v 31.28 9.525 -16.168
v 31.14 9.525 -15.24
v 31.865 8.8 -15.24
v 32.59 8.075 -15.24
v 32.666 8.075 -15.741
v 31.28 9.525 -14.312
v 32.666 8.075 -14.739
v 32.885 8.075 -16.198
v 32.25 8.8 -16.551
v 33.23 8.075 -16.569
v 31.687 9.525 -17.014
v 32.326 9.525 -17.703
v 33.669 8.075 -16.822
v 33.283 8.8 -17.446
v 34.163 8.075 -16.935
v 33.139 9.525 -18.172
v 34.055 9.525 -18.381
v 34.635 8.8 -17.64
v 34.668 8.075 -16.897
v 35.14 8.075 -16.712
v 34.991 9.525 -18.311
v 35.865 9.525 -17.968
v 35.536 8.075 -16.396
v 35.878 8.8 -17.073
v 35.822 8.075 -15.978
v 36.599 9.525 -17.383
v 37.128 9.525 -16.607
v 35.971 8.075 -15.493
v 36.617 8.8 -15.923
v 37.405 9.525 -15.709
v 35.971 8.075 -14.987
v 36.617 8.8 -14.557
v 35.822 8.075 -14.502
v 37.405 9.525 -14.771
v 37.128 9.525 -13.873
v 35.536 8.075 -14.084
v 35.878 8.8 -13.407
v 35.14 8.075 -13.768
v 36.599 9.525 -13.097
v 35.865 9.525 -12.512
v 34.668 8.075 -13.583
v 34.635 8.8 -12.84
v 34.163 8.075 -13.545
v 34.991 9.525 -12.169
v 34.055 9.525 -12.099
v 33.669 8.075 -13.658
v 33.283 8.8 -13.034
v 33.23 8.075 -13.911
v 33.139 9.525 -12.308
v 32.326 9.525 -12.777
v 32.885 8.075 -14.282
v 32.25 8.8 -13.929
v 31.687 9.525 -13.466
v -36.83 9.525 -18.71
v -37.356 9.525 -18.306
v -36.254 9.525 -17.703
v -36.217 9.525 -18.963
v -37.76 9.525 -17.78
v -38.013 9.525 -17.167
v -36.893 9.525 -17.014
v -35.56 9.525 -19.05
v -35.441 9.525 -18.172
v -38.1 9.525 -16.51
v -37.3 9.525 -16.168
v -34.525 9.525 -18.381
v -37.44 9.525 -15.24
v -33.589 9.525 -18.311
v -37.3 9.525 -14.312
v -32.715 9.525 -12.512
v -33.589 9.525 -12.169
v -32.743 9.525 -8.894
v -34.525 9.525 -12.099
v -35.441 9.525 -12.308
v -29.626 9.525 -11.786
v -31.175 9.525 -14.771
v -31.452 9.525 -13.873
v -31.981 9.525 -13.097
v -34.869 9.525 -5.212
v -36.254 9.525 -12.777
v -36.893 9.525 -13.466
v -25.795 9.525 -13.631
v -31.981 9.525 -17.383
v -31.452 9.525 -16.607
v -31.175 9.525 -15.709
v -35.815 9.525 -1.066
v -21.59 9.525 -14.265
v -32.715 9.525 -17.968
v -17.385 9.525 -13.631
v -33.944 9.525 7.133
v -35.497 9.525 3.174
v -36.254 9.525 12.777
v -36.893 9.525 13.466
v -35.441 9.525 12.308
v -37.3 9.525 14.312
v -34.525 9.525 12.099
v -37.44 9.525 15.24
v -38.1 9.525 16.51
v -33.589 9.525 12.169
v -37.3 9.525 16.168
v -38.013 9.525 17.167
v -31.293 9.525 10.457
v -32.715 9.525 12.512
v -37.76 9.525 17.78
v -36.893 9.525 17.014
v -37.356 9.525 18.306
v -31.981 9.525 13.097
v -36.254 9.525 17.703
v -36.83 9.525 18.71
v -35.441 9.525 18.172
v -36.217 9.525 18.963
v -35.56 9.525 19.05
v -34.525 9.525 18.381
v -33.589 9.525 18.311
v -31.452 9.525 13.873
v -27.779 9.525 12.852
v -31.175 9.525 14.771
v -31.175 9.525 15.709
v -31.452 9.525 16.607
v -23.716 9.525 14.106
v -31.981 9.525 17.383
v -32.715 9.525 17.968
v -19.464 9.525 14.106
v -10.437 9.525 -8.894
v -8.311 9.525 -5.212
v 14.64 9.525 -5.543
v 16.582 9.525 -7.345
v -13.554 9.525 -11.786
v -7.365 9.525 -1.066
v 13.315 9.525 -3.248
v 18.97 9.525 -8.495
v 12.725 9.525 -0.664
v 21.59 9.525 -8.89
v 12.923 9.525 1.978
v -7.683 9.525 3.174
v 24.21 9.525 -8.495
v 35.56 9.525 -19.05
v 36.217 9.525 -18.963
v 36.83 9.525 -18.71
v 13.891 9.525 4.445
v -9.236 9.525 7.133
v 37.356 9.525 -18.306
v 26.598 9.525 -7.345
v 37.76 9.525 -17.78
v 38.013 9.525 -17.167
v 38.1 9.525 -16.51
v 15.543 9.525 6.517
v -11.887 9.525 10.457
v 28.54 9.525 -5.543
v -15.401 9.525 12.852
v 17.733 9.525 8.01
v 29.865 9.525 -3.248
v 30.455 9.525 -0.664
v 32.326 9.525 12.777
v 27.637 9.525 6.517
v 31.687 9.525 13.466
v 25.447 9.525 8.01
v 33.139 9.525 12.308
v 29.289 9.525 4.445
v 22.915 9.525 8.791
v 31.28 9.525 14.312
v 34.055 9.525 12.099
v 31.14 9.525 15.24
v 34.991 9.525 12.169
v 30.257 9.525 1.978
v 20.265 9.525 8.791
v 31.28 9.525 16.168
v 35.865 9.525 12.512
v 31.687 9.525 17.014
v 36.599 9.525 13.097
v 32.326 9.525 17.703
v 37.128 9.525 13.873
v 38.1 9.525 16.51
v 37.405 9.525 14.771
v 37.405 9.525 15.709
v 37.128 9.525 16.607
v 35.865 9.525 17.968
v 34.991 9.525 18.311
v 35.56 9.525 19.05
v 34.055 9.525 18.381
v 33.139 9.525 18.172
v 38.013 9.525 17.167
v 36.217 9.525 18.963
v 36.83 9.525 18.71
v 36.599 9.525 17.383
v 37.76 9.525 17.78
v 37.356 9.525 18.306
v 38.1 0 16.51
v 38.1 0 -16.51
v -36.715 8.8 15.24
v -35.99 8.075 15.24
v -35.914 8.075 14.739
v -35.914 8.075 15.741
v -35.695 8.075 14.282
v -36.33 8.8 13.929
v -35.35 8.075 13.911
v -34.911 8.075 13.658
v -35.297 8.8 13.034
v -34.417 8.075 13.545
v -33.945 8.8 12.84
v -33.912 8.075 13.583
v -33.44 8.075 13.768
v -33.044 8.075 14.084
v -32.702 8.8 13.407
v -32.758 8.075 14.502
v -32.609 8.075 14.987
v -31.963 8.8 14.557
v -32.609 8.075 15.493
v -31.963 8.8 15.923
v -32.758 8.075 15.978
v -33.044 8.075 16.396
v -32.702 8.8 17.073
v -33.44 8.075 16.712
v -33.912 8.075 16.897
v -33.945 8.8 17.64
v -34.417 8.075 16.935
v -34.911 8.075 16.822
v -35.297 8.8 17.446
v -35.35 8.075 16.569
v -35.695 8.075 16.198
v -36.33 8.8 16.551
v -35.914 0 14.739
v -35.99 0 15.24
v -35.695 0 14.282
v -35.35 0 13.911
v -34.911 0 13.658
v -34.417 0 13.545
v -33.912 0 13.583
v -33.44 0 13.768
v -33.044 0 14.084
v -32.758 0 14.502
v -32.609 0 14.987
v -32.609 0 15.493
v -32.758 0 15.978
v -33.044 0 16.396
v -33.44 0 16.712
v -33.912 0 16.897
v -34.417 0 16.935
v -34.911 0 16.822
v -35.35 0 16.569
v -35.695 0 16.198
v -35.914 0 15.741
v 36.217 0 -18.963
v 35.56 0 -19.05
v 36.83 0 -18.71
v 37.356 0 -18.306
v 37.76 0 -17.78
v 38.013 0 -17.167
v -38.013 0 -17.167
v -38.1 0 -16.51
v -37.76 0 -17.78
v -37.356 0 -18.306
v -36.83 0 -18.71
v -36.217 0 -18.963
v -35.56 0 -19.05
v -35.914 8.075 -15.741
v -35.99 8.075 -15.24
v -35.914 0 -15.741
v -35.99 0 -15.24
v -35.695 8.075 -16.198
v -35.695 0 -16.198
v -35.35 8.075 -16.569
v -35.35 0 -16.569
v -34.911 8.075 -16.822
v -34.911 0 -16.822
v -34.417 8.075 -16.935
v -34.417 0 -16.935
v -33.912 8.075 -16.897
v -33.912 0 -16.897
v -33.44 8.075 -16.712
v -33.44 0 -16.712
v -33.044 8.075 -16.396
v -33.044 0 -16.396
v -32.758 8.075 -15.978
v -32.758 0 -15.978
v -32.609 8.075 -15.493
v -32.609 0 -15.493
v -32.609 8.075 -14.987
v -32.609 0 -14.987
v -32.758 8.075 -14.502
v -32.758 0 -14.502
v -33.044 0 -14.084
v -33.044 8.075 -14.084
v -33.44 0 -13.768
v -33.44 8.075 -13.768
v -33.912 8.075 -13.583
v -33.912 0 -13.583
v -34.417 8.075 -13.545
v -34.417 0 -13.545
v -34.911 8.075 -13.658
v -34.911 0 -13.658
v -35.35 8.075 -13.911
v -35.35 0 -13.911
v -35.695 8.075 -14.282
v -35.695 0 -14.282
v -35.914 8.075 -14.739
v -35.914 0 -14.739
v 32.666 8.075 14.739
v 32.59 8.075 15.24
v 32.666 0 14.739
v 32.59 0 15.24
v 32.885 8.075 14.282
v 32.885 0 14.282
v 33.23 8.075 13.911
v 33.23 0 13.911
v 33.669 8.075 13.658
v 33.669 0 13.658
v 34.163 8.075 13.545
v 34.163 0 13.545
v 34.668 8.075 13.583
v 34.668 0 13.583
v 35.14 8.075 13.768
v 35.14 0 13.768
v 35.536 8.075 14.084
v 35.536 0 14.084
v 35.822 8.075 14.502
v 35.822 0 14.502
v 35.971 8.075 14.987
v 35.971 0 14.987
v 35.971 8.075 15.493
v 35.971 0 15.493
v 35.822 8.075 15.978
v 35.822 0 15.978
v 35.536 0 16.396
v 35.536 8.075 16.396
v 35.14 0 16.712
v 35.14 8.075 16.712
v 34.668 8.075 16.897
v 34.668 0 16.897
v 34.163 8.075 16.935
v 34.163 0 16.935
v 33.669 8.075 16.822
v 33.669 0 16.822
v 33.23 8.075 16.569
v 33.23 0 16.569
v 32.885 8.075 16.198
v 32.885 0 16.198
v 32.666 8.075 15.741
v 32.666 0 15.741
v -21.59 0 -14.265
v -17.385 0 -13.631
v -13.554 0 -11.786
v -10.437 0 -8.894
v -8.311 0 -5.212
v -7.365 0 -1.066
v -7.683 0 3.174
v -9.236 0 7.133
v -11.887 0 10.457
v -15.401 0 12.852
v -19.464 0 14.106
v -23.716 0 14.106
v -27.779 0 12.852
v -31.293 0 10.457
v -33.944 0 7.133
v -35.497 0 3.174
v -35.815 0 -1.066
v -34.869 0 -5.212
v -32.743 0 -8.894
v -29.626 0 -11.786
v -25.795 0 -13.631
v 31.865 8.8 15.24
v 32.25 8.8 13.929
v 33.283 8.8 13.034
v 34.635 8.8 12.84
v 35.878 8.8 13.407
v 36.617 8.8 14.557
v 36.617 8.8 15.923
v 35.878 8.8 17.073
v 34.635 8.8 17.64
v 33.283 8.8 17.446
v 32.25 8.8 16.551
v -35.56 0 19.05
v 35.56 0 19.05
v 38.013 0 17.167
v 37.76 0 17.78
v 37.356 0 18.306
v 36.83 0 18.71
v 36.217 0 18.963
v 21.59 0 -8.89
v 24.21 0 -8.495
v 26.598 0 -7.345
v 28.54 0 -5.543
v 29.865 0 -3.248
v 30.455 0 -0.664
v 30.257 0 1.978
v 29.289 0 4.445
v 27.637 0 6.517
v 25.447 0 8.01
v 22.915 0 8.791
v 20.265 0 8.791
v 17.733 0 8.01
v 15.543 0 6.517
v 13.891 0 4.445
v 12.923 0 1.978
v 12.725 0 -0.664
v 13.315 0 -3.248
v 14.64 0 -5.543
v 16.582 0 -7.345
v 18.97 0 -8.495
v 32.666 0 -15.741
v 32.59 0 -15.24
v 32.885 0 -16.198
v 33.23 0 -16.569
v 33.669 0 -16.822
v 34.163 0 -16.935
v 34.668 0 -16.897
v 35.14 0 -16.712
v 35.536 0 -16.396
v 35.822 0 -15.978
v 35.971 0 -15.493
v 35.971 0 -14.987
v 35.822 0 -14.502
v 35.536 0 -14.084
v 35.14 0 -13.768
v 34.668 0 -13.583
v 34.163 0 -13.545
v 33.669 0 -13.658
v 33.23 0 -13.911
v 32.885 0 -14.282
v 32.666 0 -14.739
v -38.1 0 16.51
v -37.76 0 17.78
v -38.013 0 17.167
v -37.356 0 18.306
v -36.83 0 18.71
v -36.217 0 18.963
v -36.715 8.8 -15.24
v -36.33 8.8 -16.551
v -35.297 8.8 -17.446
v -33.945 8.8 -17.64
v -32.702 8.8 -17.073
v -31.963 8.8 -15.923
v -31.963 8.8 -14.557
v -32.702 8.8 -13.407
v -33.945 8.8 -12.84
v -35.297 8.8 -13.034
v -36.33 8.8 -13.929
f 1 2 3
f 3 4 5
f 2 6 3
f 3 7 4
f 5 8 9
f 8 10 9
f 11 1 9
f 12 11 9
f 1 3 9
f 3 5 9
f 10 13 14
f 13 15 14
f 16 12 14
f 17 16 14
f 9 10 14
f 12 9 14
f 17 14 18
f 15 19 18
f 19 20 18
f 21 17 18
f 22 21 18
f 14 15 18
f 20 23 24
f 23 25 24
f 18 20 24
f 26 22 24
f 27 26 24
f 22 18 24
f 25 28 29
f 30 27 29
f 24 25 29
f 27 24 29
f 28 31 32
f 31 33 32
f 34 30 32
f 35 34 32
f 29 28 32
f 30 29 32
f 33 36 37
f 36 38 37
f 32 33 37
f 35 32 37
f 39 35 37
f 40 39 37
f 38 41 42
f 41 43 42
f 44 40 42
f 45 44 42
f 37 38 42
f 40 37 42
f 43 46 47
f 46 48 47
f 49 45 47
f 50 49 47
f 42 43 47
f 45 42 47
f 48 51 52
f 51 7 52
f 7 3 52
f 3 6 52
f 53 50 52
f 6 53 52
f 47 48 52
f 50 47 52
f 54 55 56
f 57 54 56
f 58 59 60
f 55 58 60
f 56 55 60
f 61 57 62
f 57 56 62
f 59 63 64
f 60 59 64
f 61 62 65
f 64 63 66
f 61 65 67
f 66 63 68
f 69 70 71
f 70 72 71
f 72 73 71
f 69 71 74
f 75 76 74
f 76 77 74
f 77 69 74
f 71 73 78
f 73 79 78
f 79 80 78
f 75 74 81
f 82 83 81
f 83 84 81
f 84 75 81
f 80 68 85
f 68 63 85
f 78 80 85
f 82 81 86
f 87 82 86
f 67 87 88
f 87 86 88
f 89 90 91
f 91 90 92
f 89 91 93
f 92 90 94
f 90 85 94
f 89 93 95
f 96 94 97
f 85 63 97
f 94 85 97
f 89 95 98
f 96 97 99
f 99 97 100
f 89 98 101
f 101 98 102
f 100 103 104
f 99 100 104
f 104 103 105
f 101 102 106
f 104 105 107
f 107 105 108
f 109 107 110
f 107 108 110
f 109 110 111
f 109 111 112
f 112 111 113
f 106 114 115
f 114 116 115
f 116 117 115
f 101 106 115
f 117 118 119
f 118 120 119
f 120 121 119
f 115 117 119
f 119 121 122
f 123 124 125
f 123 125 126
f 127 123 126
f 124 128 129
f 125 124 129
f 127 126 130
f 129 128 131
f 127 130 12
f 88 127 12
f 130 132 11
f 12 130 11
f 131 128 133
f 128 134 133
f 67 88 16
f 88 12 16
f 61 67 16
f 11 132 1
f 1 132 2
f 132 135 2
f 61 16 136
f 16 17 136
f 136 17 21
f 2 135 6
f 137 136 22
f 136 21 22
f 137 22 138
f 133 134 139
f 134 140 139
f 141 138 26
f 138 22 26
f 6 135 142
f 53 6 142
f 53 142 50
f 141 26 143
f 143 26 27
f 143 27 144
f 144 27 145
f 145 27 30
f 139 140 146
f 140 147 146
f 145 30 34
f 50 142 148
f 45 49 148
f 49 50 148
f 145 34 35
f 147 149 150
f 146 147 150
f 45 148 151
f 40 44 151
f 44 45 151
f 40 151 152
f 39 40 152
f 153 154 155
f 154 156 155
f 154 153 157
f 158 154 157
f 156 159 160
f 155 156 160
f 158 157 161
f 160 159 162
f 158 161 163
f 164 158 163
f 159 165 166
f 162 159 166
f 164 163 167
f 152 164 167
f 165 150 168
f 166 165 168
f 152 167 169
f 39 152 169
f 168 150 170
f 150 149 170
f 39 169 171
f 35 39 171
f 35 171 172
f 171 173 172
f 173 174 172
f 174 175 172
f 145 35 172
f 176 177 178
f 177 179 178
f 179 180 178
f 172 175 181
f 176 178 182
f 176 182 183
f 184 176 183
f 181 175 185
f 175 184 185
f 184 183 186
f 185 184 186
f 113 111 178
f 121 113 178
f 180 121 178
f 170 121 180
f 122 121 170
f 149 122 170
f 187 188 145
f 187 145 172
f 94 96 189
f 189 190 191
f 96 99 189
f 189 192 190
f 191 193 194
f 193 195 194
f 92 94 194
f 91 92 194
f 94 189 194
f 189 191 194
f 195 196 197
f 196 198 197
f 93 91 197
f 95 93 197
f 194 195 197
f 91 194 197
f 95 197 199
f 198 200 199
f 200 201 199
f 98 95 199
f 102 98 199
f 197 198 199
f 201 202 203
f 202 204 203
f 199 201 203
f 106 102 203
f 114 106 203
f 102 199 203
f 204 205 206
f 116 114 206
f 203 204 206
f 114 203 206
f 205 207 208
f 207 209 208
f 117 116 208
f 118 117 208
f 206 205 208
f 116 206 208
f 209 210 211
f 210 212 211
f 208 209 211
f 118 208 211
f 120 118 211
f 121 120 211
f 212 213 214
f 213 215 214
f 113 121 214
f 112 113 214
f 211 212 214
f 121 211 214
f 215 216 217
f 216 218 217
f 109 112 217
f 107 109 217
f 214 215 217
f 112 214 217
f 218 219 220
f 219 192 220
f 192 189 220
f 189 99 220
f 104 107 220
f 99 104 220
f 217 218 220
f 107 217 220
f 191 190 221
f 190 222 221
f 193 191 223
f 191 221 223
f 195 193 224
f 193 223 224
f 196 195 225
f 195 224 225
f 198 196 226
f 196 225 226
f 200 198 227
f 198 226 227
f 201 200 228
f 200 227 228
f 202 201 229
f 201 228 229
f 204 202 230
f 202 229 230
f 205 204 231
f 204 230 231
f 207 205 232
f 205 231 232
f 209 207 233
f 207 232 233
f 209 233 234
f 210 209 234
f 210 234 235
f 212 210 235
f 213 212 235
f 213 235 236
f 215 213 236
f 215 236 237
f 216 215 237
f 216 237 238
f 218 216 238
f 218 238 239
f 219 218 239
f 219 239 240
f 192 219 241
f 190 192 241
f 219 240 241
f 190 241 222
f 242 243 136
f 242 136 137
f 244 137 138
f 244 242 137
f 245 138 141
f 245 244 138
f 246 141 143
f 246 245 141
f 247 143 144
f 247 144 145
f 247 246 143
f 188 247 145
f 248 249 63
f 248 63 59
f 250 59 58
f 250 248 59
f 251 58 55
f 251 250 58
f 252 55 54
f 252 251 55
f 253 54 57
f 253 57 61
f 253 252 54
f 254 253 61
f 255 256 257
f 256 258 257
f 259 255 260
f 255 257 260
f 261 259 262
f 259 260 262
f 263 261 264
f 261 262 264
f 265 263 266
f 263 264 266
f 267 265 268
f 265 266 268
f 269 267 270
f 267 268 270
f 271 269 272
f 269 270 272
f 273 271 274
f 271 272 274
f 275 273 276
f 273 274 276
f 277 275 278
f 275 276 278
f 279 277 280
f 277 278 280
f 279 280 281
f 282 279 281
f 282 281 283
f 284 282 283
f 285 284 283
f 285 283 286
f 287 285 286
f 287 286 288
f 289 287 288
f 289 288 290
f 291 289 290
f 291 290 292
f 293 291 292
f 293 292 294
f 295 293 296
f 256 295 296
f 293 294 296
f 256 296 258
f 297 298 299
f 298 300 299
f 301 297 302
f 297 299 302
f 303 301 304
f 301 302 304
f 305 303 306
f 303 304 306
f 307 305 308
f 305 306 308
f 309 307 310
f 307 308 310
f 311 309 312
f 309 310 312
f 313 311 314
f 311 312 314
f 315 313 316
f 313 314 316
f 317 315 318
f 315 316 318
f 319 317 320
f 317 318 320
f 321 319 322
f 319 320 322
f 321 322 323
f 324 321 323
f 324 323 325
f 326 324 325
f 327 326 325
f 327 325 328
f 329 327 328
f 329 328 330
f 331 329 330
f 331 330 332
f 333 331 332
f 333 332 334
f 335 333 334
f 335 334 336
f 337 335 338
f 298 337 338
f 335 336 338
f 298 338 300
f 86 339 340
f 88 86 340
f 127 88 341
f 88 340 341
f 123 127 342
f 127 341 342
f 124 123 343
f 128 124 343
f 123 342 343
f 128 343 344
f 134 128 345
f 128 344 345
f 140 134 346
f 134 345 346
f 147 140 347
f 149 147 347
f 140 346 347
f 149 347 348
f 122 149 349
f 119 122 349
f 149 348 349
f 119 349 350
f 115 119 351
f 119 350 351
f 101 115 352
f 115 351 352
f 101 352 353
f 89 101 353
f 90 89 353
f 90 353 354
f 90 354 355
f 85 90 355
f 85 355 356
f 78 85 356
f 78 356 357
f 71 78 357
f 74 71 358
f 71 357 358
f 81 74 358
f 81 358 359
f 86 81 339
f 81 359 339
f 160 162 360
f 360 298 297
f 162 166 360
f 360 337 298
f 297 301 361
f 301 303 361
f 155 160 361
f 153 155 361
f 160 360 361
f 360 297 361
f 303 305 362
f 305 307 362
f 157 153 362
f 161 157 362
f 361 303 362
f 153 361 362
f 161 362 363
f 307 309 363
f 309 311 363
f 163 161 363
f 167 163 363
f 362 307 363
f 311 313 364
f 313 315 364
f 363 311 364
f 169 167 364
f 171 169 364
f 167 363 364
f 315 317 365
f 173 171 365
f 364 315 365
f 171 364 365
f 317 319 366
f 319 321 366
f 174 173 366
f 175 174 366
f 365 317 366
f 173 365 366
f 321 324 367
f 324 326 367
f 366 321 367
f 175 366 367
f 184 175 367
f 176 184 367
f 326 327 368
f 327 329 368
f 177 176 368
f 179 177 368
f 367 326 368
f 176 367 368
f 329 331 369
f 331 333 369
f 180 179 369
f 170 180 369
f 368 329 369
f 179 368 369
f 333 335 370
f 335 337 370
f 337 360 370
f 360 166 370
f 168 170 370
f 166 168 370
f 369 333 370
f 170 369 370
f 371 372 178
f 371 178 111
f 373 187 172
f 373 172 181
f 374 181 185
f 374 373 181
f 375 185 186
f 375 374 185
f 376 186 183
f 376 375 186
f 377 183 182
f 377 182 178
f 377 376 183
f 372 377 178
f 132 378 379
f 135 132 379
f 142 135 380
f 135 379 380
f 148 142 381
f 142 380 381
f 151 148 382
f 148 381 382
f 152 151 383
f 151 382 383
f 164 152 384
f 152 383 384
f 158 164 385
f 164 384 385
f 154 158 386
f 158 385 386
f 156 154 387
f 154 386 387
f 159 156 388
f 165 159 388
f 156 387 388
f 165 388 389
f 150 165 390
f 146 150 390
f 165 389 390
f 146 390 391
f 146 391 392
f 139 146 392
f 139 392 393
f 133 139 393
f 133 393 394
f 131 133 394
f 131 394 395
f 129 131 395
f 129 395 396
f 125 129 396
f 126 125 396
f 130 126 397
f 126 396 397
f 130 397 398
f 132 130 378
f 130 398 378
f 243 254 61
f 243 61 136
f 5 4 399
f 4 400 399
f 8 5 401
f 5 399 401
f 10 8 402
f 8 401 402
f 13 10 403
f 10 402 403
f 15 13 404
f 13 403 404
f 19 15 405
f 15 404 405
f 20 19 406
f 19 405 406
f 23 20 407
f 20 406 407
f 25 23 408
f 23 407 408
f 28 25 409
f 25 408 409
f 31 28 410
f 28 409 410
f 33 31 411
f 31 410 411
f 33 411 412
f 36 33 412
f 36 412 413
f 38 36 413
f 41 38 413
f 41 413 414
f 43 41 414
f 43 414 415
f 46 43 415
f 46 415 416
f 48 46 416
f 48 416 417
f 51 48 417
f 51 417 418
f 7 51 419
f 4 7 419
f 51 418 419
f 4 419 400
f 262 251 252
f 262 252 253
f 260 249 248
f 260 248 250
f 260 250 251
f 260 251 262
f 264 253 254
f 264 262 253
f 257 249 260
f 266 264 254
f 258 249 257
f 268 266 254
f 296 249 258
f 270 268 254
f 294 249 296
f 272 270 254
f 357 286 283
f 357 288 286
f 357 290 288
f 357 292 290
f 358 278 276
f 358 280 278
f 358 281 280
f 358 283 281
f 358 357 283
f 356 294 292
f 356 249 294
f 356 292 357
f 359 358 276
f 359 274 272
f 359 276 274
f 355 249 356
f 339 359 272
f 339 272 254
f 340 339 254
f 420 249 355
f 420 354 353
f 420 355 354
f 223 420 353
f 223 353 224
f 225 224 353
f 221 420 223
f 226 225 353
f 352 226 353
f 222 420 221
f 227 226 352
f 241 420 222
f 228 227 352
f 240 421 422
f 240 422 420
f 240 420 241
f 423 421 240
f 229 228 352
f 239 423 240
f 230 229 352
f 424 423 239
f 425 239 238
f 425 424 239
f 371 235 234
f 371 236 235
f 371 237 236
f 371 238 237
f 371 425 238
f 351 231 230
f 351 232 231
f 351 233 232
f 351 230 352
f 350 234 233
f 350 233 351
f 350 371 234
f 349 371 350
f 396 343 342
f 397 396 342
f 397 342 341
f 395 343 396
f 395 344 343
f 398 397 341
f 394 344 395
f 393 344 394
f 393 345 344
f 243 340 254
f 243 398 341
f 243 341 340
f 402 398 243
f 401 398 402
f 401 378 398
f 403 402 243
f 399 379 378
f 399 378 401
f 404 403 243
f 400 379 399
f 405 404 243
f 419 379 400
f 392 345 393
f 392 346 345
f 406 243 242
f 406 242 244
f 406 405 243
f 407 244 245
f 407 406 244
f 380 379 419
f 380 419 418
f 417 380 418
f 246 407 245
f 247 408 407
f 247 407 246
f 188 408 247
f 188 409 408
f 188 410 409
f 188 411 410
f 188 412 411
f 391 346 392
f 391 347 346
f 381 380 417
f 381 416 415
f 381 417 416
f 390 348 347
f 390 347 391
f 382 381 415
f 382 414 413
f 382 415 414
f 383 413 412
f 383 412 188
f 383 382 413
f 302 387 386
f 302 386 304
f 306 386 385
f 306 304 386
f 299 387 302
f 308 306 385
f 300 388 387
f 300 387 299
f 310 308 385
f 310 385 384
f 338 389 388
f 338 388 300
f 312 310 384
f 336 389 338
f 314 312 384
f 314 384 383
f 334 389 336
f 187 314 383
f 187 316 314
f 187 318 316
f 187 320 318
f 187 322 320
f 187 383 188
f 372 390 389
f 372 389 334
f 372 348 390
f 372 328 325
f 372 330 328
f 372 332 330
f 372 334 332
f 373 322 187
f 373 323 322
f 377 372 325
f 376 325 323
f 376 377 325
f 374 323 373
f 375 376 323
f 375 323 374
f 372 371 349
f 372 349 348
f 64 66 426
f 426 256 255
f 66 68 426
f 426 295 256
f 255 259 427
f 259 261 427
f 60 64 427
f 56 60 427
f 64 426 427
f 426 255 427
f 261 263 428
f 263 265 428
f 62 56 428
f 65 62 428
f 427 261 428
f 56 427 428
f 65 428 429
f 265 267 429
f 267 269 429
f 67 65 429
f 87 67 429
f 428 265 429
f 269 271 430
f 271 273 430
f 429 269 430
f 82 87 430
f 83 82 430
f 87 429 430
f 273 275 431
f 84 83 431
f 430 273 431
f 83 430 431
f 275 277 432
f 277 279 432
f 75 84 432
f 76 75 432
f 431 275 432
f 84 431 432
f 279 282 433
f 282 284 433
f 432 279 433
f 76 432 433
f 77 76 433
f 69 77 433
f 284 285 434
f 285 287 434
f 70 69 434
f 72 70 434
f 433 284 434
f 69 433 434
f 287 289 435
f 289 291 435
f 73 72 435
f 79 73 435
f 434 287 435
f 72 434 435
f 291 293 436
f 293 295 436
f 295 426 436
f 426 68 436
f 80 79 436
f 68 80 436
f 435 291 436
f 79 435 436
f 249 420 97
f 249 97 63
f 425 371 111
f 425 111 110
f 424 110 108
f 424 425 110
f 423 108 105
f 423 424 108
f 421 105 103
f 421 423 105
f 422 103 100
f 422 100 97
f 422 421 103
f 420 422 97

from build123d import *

# Parameters (mm, degrees)
SKETCH1_R                                       = 8.89
SKETCH1_R_2                                     = 14.265
BOSS_EXTRUDE1_DEPTH                             = 9.525
CSK_FOR_M3_FLAT_HEAD_MACHINE_SCREW1_D           = 3.4
CSK_FOR_M3_FLAT_HEAD_MACHINE_SCREW1_DEPTH       = 9.99998
CSK_FOR_M3_FLAT_HEAD_MACHINE_SCREW1_CSINK_D     = 6.3
CSK_FOR_M3_FLAT_HEAD_MACHINE_SCREW1_CSINK_ANGLE = 90
CSK_FOR_M3_FLAT_HEAD_MACHINE_SCREW1_TIP         = 1.021463052


with BuildPart() as part:
    # Sketch1 → Boss-Extrude1 (new body)
    with BuildSketch(Plane.XZ):
        with BuildLine():
            Line((-35.56, -19.05), (35.56, -19.05))
            ThreePointArc((35.56, -19.05), (37.356051224, -18.306051224), (38.1, -16.51))
            Line((38.1, -16.51), (38.1, 16.51))
            ThreePointArc((38.1, 16.51), (37.356051224, 18.306051224), (35.56, 19.05))
            Line((35.56, 19.05), (-35.56, 19.05))
            ThreePointArc((-35.56, 19.05), (-37.356051224, 18.306051224), (-38.1, 16.51))
            Line((-38.1, 16.51), (-38.1, -16.51))
            ThreePointArc((-38.1, -16.51), (-37.356051224, -18.306051224), (-35.56, -19.05))
        make_face()
        with Locations(Location((21.59, 0, 0), (0, 0, 270))):
            Circle(SKETCH1_R, mode=Mode.SUBTRACT)
        with Locations(Location((-21.59, 0, 0), (0, 0, 270))):
            Circle(SKETCH1_R_2, mode=Mode.SUBTRACT)
    extrude(amount=-BOSS_EXTRUDE1_DEPTH)

    # CSK for M3 Flat Head Machine Screw1
    with Locations(Plane(origin=(0, 9.525, 0), x_dir=(1, 0, 0), z_dir=(0, 1, 0))):
        with Locations((-34.29, 15.24), (-34.29, -15.24), (34.29, -15.24), (34.29, 15.24)):
            CounterSinkHole(CSK_FOR_M3_FLAT_HEAD_MACHINE_SCREW1_D / 2, CSK_FOR_M3_FLAT_HEAD_MACHINE_SCREW1_CSINK_D / 2, depth=CSK_FOR_M3_FLAT_HEAD_MACHINE_SCREW1_DEPTH, counter_sink_angle=CSK_FOR_M3_FLAT_HEAD_MACHINE_SCREW1_CSINK_ANGLE)
            with Locations((0, 0, -(CSK_FOR_M3_FLAT_HEAD_MACHINE_SCREW1_DEPTH + CSK_FOR_M3_FLAT_HEAD_MACHINE_SCREW1_TIP / 2))):  # 118° drill point
                Cone(0, CSK_FOR_M3_FLAT_HEAD_MACHINE_SCREW1_D / 2, CSK_FOR_M3_FLAT_HEAD_MACHINE_SCREW1_TIP, mode=Mode.SUBTRACT)


solid = part.part
